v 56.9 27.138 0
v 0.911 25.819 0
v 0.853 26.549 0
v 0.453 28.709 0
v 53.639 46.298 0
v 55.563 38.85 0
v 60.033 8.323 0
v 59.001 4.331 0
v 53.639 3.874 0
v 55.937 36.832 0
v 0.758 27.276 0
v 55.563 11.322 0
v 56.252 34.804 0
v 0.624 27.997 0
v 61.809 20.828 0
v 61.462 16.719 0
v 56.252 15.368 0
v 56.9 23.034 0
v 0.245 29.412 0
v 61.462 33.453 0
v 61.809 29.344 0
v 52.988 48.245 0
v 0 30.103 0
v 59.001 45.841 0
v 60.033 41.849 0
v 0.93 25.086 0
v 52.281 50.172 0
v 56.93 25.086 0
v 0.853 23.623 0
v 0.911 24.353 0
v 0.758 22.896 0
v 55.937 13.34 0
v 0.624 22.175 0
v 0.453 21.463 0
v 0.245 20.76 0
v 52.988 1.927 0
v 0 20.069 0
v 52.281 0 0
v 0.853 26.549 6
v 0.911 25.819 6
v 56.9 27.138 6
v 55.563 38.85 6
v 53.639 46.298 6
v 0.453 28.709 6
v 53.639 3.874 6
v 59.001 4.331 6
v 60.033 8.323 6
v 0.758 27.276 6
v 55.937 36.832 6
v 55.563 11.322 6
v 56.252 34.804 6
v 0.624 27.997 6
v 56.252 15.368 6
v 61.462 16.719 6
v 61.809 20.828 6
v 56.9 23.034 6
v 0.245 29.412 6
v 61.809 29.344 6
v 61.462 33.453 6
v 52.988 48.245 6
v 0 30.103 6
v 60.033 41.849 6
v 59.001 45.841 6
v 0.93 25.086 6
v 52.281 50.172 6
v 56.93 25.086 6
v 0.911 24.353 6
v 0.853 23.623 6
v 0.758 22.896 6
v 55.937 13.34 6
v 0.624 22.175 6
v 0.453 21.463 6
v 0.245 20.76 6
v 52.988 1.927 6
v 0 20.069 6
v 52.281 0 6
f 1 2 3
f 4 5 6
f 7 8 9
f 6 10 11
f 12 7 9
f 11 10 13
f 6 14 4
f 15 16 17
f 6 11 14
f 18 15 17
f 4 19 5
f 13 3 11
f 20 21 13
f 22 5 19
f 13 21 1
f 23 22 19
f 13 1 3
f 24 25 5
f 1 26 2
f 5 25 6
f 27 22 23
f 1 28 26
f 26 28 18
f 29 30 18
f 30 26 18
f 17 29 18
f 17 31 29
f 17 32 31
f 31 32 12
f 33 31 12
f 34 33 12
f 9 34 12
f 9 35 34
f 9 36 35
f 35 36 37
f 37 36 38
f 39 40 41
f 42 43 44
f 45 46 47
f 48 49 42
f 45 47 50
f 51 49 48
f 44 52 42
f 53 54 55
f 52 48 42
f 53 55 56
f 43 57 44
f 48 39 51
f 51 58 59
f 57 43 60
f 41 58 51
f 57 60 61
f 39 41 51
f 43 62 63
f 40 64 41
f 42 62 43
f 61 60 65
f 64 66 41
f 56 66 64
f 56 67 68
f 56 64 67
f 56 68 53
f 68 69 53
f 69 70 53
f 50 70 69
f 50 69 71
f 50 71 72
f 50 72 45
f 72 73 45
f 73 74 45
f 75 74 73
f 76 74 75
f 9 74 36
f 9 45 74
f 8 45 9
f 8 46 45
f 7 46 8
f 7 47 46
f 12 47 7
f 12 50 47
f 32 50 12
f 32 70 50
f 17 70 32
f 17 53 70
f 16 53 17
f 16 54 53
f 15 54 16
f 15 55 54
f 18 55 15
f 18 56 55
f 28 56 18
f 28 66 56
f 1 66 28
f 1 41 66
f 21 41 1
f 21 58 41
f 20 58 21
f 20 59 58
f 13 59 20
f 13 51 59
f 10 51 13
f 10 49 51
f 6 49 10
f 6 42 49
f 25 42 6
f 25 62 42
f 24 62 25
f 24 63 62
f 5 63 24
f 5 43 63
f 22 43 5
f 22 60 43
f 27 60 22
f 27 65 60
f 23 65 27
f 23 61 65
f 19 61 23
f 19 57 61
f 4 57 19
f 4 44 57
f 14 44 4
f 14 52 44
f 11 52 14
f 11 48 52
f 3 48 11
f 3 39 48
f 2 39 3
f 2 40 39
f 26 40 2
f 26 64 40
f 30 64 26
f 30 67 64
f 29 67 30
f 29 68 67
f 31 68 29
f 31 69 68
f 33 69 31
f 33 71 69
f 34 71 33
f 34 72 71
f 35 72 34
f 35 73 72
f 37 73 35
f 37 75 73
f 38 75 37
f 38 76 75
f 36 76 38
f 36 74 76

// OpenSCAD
$fn = 32;

// ----------------------------------------------------------------------
// Gear sector: 4 teeth on 42 degrees
// ----------------------------------------------------------------------

// --- parameters (mm) ---
sector_angle = 42;        // sector angle, degrees
root_r = 70;              // root circle radius
tooth_h = 5;              // tooth height over the root circle
teeth = 4;                // number of teeth on the sector
hub_r = 14;               // hub bore radius
plate_t = 6;              // sector thickness, Z
arc_step = 3;             // sampling step of the root/hub arcs, degrees

tip_r = root_r + tooth_h;  // tip circle radius

profile = [[52.281, 0], [52.988, 1.927], [53.639, 3.874], [59.001, 4.331], [60.033, 8.323], [55.563, 11.322], [55.937, 13.34], [56.252, 15.368], [61.462, 16.719], [61.809, 20.828], [56.9, 23.034], [56.93, 25.086], [56.9, 27.138], [61.809, 29.344], [61.462, 33.453], [56.252, 34.804], [55.937, 36.832], [55.563, 38.85], [60.033, 41.849], [59.001, 45.841], [53.639, 46.298], [52.988, 48.245], [52.281, 50.172], [0, 30.103], [0.245, 29.412], [0.453, 28.709], [0.624, 27.997], [0.758, 27.276], [0.853, 26.549], [0.911, 25.819], [0.93, 25.086], [0.911, 24.353], [0.853, 23.623], [0.758, 22.896], [0.624, 22.175], [0.453, 21.463], [0.245, 20.76], [0, 20.069]];  // primary outline, 38 points, counter clockwise

// --- the one profile operation ---
linear_extrude(height = plate_t) polygon(points = profile);
